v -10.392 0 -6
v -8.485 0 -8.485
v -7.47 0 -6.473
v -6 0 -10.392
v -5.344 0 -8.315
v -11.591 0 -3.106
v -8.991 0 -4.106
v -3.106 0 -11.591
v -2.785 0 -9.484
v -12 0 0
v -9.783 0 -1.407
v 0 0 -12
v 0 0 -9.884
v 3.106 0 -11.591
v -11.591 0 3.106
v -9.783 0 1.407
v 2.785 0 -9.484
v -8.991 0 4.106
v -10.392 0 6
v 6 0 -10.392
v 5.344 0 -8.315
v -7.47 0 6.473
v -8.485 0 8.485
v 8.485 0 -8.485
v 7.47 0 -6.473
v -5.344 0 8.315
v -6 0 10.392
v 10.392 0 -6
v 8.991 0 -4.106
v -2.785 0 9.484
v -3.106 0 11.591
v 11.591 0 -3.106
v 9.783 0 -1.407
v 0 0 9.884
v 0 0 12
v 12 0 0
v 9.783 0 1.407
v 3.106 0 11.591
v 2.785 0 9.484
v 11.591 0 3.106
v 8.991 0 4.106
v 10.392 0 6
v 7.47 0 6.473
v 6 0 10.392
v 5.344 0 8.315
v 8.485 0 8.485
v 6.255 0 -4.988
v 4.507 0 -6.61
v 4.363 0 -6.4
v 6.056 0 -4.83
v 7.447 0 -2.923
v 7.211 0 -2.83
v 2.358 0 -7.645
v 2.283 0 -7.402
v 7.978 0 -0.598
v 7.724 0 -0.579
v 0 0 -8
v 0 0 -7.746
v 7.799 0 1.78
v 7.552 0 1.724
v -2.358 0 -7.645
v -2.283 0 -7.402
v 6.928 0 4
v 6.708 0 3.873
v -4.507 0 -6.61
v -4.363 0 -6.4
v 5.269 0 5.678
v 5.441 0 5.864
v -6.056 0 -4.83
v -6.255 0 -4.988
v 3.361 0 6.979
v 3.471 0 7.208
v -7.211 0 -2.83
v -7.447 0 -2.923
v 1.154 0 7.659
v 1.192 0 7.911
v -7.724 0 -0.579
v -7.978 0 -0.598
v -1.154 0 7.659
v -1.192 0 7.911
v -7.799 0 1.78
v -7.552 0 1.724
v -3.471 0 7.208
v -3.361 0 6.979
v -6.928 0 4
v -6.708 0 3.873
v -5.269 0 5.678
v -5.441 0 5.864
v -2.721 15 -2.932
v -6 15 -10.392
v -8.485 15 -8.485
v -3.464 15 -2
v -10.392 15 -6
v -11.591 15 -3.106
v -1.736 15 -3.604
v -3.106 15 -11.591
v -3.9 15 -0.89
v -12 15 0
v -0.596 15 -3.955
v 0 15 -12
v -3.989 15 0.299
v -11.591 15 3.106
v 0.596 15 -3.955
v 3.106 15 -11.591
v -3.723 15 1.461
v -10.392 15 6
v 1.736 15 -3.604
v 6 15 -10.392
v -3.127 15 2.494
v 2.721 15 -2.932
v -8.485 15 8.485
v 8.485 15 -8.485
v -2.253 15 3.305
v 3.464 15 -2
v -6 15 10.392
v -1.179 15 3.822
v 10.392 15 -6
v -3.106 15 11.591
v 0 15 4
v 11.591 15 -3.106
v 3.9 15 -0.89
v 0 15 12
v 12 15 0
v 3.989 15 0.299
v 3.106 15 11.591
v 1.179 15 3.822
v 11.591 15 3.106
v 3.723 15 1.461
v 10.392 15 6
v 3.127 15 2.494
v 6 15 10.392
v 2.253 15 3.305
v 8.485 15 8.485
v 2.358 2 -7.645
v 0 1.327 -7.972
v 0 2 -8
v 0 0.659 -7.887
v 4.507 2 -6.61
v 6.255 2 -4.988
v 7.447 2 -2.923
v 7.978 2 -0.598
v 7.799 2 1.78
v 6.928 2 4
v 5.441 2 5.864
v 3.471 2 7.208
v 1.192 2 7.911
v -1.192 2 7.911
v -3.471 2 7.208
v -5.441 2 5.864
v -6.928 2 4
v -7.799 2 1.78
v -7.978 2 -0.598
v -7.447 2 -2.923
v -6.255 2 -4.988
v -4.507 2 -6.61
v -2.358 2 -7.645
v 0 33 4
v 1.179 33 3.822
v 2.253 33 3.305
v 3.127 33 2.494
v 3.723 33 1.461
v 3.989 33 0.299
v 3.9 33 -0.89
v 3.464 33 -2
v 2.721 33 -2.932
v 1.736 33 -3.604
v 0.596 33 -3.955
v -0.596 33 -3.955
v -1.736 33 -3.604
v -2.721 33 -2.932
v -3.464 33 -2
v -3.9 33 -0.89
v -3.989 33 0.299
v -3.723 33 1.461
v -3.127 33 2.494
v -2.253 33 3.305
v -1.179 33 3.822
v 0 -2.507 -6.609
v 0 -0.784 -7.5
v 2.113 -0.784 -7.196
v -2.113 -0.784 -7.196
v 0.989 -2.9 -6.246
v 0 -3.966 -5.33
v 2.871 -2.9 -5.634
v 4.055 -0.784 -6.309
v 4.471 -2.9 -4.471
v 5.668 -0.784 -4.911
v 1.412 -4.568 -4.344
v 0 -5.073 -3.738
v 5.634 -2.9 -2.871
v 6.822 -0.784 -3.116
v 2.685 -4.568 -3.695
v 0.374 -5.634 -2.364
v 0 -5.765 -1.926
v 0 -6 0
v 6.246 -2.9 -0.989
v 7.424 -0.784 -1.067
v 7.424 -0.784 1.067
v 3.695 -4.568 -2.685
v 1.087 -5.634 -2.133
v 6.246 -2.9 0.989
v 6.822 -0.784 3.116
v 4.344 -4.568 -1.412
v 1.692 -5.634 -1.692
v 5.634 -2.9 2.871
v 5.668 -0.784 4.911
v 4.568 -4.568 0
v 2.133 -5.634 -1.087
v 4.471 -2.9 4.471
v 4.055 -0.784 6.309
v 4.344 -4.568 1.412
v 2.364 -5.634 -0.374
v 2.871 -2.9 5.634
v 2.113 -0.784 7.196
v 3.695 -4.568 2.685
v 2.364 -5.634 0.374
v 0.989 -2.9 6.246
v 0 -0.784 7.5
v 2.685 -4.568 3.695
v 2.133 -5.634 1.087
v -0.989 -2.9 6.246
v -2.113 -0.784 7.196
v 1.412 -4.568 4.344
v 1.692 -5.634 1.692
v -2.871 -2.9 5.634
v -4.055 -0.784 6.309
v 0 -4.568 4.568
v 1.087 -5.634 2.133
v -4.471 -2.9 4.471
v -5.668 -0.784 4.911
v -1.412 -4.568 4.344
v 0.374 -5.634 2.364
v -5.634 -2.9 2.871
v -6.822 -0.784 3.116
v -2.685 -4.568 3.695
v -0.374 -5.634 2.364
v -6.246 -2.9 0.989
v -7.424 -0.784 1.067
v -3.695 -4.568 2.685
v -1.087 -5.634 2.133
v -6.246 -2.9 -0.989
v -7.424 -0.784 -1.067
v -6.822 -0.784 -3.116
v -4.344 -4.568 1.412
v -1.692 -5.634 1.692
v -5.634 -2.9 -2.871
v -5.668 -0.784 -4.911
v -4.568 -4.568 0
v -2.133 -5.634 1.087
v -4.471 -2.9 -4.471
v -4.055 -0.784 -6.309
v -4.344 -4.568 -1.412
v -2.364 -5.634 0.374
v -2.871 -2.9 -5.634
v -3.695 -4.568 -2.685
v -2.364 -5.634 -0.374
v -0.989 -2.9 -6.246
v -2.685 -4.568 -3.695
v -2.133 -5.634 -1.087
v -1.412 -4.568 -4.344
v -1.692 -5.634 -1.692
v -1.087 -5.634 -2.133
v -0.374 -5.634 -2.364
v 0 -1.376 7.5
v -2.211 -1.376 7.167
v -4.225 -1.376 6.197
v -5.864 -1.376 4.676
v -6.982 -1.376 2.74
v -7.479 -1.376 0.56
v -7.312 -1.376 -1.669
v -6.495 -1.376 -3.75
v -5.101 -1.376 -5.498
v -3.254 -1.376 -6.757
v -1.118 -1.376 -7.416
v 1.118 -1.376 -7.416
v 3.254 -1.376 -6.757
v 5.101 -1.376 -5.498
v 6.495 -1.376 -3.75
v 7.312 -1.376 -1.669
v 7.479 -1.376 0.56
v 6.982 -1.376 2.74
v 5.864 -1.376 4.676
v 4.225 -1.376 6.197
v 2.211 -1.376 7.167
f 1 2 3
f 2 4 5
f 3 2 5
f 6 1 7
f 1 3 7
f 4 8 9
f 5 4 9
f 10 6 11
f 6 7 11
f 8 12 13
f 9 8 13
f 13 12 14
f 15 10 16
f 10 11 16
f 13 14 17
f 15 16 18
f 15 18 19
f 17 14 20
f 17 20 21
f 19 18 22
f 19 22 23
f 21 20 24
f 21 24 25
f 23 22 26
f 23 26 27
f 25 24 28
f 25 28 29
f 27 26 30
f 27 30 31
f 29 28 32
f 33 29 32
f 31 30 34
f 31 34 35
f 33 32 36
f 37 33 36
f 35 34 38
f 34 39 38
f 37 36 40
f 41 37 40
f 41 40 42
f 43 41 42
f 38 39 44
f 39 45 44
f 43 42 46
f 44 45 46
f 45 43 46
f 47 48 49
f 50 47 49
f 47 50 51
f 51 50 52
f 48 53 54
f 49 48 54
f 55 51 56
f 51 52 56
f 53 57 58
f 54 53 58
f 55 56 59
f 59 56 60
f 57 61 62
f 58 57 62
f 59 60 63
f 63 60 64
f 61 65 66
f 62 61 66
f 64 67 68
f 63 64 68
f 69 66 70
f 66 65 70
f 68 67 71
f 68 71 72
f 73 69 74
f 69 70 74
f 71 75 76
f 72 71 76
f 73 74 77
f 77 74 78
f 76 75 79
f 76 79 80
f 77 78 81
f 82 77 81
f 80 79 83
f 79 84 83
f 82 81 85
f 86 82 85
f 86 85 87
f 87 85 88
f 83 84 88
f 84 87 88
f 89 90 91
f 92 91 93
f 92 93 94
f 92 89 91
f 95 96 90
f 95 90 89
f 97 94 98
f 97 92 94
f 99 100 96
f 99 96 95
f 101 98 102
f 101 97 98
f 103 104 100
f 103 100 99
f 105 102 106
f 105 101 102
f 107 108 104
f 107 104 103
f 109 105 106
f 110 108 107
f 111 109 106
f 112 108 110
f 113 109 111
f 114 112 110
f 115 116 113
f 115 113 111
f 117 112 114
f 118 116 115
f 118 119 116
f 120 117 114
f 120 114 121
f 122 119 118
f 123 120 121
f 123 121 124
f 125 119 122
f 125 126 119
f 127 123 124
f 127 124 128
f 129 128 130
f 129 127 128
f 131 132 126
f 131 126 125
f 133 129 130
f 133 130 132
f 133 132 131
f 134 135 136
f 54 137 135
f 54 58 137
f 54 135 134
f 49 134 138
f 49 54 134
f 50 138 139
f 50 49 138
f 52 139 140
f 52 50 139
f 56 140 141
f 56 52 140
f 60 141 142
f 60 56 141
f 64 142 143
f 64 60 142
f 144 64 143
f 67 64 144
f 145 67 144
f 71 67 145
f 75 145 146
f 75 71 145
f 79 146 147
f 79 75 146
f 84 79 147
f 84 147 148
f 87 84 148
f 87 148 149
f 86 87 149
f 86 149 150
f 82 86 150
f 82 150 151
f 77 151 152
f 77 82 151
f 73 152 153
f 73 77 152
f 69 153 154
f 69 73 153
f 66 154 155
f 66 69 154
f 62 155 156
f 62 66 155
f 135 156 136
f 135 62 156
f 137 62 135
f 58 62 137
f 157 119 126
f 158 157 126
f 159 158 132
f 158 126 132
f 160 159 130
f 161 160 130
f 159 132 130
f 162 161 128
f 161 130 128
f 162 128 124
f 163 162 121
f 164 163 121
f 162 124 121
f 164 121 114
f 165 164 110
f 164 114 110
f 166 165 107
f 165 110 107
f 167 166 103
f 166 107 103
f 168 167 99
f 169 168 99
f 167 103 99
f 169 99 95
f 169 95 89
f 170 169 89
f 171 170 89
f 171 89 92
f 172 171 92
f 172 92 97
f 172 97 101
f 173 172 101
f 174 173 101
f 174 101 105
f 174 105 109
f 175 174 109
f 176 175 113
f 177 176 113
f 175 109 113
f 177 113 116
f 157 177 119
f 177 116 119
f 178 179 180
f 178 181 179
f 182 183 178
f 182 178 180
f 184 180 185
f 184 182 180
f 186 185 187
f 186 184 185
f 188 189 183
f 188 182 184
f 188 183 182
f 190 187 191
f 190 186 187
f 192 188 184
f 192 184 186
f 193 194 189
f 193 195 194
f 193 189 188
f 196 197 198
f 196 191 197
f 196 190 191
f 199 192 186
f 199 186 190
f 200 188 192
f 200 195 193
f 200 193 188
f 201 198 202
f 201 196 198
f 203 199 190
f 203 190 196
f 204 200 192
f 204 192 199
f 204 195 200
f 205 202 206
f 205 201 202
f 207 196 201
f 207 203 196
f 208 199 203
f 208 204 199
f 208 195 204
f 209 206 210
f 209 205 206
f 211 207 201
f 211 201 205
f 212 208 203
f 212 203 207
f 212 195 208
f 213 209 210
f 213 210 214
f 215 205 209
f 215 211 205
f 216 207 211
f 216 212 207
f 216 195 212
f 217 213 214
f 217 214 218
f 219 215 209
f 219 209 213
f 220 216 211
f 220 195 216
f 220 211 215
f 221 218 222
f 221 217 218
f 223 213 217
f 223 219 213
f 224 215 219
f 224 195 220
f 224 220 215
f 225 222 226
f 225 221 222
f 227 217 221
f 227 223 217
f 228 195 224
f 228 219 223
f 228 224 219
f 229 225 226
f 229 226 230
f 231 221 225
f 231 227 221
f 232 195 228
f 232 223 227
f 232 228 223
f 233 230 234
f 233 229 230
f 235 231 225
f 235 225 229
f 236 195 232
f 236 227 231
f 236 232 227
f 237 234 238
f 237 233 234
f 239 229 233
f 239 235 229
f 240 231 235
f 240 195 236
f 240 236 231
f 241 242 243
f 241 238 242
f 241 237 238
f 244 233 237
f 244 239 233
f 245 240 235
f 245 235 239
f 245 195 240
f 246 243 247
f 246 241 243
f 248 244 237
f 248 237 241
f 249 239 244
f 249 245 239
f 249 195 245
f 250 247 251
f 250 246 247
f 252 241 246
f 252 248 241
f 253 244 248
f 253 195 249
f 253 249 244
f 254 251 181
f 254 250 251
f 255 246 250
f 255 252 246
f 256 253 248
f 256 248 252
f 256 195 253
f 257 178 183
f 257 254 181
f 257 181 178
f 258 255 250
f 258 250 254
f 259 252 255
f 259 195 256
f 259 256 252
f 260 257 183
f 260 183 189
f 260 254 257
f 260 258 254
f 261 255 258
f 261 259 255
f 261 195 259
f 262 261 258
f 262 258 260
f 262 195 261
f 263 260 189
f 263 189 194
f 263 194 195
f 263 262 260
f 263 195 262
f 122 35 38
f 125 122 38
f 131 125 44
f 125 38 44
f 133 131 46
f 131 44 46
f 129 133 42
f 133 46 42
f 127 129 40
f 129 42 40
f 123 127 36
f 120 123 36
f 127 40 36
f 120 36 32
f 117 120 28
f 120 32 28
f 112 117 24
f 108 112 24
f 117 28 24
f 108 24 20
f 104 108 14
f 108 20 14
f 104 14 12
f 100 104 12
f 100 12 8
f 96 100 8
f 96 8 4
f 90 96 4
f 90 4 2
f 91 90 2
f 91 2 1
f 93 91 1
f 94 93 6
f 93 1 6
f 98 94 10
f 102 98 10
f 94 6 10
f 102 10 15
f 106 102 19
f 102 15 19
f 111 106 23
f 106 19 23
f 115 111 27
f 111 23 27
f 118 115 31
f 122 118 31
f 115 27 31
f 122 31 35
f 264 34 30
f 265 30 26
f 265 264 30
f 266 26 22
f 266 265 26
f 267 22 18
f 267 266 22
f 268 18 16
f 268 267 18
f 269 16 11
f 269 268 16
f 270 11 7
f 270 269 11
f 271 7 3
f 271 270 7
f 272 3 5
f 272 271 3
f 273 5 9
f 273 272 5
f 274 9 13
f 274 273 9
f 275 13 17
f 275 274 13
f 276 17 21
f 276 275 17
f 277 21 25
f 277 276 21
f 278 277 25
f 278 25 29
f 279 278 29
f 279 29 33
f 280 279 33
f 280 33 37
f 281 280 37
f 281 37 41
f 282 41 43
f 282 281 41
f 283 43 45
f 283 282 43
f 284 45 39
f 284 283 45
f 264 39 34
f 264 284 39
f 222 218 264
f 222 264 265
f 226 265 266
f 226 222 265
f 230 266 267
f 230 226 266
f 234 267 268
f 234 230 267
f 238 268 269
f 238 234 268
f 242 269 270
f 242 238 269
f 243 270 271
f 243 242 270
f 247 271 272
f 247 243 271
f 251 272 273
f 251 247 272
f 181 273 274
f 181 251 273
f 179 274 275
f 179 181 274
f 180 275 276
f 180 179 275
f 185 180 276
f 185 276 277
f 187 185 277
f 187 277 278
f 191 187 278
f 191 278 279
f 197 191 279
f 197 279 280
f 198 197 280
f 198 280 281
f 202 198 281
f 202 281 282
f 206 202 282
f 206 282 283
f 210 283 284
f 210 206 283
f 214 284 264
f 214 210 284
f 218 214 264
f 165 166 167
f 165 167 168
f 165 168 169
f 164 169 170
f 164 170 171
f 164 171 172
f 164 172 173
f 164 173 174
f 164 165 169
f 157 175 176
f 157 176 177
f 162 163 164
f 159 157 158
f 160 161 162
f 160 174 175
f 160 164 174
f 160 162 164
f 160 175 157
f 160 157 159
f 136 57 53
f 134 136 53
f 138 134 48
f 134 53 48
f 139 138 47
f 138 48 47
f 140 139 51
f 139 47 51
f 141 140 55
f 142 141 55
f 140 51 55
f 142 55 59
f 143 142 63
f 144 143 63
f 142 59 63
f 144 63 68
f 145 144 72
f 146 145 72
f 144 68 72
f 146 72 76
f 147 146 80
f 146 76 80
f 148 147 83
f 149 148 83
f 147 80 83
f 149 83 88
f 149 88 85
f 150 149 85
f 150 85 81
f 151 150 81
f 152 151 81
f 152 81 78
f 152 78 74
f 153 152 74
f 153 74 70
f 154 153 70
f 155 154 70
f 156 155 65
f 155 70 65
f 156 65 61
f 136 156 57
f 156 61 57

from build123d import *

# Parameters (mm, degrees)
SKETCH1_R           = 12
BOSS_EXTRUDE1_DEPTH = 15
SKETCH2_R           = 4
BOSS_EXTRUDE2_DEPTH = 18
SKETCH4_R           = 8
CUT_EXTRUDE1_DEPTH  = 2
DOME1_FACE_RADIUS   = 8
DOME1_HEIGHT        = 8
SKETCH5_R           = 10.75
SKETCH5_R_2         = 7.5
BOSS_EXTRUDE3_DEPTH = 1.5
CHAMFER1_SIZE       = 2
CHAMFER1_SIZE_2     = 3.464101615


with BuildPart() as part:
    # Sketch1 → Boss-Extrude1 (new body)
    with BuildSketch(Plane(origin=(0, 0, 0), x_dir=(1, 0, 0), z_dir=(0, 1, 0))):
        with Locations(Location((0, 0, 0), (0, 0, 270))):
            Circle(SKETCH1_R)
    extrude(amount=BOSS_EXTRUDE1_DEPTH)

    # Sketch2 → Boss-Extrude2 (add)
    with BuildSketch(Plane(origin=(0, 15, 0), x_dir=(1, 0, 0), z_dir=(0, 1, 0))):
        with Locations(Location((0, 0, 0), (0, 0, 270))):
            Circle(SKETCH2_R)
    extrude(amount=BOSS_EXTRUDE2_DEPTH)

    # Sketch4 → Cut-Extrude1 (cut)
    with BuildSketch(Plane.XZ):
        with Locations(Location((0, 0, 0), (0, 0, 270))):
            Circle(SKETCH4_R)
    extrude(amount=-CUT_EXTRUDE1_DEPTH, mode=Mode.SUBTRACT)

    # Dome1: a dome of height H over a round flat face of radius A is a cap of a sphere of radius (A * A + H * H) / (2 * H)
    dome1_r = (DOME1_FACE_RADIUS * DOME1_FACE_RADIUS + DOME1_HEIGHT * DOME1_HEIGHT) / (2 * DOME1_HEIGHT)
    dome1_base = Plane((0, 2, 0), z_dir=(0, -1, 0))
    with Locations(dome1_base.offset(DOME1_HEIGHT - dome1_r)):
        dome1_ball = Sphere(dome1_r, mode=Mode.PRIVATE)
    add(split(dome1_ball, bisect_by=dome1_base, keep=Keep.TOP, mode=Mode.PRIVATE))

    # Sketch5 → Boss-Extrude3 (add)
    with BuildSketch(Plane.XZ):
        with Locations(Location((0, 0, 0), (0, 0, 90))):
            Circle(SKETCH5_R)
        with Locations(Location((0, 0, 0), (0, 0, 90))):
            Circle(SKETCH5_R_2, mode=Mode.SUBTRACT)
    extrude(amount=BOSS_EXTRUDE3_DEPTH)

    # Chamfer1
    # the kernel refuses this chamfer: 3.464101615, 2 mm, written as the material it takes off along each edge
    with BuildSketch(Plane(origin=(0, -1.5, 0), x_dir=(0, 0, 1), z_dir=(1, 0, 0))) as chamfer1_piece_1_section:
        Polygon((10.75, -CHAMFER1_SIZE), (10.75 - CHAMFER1_SIZE_2, 0), (10.75, 0), align=None)
    chamfer1_piece_1 = revolve(axis=Axis((0, -1.5, 0), (0, -1, 0)), mode=Mode.PRIVATE)
    chamfer1_piece_1 = split(chamfer1_piece_1, bisect_by=Plane(origin=(0, 0, -8.554997787), z_dir=(0, -1, 0)), keep=Keep.TOP, mode=Mode.PRIVATE)
    add(chamfer1_piece_1, mode=Mode.SUBTRACT)


solid = part.part
